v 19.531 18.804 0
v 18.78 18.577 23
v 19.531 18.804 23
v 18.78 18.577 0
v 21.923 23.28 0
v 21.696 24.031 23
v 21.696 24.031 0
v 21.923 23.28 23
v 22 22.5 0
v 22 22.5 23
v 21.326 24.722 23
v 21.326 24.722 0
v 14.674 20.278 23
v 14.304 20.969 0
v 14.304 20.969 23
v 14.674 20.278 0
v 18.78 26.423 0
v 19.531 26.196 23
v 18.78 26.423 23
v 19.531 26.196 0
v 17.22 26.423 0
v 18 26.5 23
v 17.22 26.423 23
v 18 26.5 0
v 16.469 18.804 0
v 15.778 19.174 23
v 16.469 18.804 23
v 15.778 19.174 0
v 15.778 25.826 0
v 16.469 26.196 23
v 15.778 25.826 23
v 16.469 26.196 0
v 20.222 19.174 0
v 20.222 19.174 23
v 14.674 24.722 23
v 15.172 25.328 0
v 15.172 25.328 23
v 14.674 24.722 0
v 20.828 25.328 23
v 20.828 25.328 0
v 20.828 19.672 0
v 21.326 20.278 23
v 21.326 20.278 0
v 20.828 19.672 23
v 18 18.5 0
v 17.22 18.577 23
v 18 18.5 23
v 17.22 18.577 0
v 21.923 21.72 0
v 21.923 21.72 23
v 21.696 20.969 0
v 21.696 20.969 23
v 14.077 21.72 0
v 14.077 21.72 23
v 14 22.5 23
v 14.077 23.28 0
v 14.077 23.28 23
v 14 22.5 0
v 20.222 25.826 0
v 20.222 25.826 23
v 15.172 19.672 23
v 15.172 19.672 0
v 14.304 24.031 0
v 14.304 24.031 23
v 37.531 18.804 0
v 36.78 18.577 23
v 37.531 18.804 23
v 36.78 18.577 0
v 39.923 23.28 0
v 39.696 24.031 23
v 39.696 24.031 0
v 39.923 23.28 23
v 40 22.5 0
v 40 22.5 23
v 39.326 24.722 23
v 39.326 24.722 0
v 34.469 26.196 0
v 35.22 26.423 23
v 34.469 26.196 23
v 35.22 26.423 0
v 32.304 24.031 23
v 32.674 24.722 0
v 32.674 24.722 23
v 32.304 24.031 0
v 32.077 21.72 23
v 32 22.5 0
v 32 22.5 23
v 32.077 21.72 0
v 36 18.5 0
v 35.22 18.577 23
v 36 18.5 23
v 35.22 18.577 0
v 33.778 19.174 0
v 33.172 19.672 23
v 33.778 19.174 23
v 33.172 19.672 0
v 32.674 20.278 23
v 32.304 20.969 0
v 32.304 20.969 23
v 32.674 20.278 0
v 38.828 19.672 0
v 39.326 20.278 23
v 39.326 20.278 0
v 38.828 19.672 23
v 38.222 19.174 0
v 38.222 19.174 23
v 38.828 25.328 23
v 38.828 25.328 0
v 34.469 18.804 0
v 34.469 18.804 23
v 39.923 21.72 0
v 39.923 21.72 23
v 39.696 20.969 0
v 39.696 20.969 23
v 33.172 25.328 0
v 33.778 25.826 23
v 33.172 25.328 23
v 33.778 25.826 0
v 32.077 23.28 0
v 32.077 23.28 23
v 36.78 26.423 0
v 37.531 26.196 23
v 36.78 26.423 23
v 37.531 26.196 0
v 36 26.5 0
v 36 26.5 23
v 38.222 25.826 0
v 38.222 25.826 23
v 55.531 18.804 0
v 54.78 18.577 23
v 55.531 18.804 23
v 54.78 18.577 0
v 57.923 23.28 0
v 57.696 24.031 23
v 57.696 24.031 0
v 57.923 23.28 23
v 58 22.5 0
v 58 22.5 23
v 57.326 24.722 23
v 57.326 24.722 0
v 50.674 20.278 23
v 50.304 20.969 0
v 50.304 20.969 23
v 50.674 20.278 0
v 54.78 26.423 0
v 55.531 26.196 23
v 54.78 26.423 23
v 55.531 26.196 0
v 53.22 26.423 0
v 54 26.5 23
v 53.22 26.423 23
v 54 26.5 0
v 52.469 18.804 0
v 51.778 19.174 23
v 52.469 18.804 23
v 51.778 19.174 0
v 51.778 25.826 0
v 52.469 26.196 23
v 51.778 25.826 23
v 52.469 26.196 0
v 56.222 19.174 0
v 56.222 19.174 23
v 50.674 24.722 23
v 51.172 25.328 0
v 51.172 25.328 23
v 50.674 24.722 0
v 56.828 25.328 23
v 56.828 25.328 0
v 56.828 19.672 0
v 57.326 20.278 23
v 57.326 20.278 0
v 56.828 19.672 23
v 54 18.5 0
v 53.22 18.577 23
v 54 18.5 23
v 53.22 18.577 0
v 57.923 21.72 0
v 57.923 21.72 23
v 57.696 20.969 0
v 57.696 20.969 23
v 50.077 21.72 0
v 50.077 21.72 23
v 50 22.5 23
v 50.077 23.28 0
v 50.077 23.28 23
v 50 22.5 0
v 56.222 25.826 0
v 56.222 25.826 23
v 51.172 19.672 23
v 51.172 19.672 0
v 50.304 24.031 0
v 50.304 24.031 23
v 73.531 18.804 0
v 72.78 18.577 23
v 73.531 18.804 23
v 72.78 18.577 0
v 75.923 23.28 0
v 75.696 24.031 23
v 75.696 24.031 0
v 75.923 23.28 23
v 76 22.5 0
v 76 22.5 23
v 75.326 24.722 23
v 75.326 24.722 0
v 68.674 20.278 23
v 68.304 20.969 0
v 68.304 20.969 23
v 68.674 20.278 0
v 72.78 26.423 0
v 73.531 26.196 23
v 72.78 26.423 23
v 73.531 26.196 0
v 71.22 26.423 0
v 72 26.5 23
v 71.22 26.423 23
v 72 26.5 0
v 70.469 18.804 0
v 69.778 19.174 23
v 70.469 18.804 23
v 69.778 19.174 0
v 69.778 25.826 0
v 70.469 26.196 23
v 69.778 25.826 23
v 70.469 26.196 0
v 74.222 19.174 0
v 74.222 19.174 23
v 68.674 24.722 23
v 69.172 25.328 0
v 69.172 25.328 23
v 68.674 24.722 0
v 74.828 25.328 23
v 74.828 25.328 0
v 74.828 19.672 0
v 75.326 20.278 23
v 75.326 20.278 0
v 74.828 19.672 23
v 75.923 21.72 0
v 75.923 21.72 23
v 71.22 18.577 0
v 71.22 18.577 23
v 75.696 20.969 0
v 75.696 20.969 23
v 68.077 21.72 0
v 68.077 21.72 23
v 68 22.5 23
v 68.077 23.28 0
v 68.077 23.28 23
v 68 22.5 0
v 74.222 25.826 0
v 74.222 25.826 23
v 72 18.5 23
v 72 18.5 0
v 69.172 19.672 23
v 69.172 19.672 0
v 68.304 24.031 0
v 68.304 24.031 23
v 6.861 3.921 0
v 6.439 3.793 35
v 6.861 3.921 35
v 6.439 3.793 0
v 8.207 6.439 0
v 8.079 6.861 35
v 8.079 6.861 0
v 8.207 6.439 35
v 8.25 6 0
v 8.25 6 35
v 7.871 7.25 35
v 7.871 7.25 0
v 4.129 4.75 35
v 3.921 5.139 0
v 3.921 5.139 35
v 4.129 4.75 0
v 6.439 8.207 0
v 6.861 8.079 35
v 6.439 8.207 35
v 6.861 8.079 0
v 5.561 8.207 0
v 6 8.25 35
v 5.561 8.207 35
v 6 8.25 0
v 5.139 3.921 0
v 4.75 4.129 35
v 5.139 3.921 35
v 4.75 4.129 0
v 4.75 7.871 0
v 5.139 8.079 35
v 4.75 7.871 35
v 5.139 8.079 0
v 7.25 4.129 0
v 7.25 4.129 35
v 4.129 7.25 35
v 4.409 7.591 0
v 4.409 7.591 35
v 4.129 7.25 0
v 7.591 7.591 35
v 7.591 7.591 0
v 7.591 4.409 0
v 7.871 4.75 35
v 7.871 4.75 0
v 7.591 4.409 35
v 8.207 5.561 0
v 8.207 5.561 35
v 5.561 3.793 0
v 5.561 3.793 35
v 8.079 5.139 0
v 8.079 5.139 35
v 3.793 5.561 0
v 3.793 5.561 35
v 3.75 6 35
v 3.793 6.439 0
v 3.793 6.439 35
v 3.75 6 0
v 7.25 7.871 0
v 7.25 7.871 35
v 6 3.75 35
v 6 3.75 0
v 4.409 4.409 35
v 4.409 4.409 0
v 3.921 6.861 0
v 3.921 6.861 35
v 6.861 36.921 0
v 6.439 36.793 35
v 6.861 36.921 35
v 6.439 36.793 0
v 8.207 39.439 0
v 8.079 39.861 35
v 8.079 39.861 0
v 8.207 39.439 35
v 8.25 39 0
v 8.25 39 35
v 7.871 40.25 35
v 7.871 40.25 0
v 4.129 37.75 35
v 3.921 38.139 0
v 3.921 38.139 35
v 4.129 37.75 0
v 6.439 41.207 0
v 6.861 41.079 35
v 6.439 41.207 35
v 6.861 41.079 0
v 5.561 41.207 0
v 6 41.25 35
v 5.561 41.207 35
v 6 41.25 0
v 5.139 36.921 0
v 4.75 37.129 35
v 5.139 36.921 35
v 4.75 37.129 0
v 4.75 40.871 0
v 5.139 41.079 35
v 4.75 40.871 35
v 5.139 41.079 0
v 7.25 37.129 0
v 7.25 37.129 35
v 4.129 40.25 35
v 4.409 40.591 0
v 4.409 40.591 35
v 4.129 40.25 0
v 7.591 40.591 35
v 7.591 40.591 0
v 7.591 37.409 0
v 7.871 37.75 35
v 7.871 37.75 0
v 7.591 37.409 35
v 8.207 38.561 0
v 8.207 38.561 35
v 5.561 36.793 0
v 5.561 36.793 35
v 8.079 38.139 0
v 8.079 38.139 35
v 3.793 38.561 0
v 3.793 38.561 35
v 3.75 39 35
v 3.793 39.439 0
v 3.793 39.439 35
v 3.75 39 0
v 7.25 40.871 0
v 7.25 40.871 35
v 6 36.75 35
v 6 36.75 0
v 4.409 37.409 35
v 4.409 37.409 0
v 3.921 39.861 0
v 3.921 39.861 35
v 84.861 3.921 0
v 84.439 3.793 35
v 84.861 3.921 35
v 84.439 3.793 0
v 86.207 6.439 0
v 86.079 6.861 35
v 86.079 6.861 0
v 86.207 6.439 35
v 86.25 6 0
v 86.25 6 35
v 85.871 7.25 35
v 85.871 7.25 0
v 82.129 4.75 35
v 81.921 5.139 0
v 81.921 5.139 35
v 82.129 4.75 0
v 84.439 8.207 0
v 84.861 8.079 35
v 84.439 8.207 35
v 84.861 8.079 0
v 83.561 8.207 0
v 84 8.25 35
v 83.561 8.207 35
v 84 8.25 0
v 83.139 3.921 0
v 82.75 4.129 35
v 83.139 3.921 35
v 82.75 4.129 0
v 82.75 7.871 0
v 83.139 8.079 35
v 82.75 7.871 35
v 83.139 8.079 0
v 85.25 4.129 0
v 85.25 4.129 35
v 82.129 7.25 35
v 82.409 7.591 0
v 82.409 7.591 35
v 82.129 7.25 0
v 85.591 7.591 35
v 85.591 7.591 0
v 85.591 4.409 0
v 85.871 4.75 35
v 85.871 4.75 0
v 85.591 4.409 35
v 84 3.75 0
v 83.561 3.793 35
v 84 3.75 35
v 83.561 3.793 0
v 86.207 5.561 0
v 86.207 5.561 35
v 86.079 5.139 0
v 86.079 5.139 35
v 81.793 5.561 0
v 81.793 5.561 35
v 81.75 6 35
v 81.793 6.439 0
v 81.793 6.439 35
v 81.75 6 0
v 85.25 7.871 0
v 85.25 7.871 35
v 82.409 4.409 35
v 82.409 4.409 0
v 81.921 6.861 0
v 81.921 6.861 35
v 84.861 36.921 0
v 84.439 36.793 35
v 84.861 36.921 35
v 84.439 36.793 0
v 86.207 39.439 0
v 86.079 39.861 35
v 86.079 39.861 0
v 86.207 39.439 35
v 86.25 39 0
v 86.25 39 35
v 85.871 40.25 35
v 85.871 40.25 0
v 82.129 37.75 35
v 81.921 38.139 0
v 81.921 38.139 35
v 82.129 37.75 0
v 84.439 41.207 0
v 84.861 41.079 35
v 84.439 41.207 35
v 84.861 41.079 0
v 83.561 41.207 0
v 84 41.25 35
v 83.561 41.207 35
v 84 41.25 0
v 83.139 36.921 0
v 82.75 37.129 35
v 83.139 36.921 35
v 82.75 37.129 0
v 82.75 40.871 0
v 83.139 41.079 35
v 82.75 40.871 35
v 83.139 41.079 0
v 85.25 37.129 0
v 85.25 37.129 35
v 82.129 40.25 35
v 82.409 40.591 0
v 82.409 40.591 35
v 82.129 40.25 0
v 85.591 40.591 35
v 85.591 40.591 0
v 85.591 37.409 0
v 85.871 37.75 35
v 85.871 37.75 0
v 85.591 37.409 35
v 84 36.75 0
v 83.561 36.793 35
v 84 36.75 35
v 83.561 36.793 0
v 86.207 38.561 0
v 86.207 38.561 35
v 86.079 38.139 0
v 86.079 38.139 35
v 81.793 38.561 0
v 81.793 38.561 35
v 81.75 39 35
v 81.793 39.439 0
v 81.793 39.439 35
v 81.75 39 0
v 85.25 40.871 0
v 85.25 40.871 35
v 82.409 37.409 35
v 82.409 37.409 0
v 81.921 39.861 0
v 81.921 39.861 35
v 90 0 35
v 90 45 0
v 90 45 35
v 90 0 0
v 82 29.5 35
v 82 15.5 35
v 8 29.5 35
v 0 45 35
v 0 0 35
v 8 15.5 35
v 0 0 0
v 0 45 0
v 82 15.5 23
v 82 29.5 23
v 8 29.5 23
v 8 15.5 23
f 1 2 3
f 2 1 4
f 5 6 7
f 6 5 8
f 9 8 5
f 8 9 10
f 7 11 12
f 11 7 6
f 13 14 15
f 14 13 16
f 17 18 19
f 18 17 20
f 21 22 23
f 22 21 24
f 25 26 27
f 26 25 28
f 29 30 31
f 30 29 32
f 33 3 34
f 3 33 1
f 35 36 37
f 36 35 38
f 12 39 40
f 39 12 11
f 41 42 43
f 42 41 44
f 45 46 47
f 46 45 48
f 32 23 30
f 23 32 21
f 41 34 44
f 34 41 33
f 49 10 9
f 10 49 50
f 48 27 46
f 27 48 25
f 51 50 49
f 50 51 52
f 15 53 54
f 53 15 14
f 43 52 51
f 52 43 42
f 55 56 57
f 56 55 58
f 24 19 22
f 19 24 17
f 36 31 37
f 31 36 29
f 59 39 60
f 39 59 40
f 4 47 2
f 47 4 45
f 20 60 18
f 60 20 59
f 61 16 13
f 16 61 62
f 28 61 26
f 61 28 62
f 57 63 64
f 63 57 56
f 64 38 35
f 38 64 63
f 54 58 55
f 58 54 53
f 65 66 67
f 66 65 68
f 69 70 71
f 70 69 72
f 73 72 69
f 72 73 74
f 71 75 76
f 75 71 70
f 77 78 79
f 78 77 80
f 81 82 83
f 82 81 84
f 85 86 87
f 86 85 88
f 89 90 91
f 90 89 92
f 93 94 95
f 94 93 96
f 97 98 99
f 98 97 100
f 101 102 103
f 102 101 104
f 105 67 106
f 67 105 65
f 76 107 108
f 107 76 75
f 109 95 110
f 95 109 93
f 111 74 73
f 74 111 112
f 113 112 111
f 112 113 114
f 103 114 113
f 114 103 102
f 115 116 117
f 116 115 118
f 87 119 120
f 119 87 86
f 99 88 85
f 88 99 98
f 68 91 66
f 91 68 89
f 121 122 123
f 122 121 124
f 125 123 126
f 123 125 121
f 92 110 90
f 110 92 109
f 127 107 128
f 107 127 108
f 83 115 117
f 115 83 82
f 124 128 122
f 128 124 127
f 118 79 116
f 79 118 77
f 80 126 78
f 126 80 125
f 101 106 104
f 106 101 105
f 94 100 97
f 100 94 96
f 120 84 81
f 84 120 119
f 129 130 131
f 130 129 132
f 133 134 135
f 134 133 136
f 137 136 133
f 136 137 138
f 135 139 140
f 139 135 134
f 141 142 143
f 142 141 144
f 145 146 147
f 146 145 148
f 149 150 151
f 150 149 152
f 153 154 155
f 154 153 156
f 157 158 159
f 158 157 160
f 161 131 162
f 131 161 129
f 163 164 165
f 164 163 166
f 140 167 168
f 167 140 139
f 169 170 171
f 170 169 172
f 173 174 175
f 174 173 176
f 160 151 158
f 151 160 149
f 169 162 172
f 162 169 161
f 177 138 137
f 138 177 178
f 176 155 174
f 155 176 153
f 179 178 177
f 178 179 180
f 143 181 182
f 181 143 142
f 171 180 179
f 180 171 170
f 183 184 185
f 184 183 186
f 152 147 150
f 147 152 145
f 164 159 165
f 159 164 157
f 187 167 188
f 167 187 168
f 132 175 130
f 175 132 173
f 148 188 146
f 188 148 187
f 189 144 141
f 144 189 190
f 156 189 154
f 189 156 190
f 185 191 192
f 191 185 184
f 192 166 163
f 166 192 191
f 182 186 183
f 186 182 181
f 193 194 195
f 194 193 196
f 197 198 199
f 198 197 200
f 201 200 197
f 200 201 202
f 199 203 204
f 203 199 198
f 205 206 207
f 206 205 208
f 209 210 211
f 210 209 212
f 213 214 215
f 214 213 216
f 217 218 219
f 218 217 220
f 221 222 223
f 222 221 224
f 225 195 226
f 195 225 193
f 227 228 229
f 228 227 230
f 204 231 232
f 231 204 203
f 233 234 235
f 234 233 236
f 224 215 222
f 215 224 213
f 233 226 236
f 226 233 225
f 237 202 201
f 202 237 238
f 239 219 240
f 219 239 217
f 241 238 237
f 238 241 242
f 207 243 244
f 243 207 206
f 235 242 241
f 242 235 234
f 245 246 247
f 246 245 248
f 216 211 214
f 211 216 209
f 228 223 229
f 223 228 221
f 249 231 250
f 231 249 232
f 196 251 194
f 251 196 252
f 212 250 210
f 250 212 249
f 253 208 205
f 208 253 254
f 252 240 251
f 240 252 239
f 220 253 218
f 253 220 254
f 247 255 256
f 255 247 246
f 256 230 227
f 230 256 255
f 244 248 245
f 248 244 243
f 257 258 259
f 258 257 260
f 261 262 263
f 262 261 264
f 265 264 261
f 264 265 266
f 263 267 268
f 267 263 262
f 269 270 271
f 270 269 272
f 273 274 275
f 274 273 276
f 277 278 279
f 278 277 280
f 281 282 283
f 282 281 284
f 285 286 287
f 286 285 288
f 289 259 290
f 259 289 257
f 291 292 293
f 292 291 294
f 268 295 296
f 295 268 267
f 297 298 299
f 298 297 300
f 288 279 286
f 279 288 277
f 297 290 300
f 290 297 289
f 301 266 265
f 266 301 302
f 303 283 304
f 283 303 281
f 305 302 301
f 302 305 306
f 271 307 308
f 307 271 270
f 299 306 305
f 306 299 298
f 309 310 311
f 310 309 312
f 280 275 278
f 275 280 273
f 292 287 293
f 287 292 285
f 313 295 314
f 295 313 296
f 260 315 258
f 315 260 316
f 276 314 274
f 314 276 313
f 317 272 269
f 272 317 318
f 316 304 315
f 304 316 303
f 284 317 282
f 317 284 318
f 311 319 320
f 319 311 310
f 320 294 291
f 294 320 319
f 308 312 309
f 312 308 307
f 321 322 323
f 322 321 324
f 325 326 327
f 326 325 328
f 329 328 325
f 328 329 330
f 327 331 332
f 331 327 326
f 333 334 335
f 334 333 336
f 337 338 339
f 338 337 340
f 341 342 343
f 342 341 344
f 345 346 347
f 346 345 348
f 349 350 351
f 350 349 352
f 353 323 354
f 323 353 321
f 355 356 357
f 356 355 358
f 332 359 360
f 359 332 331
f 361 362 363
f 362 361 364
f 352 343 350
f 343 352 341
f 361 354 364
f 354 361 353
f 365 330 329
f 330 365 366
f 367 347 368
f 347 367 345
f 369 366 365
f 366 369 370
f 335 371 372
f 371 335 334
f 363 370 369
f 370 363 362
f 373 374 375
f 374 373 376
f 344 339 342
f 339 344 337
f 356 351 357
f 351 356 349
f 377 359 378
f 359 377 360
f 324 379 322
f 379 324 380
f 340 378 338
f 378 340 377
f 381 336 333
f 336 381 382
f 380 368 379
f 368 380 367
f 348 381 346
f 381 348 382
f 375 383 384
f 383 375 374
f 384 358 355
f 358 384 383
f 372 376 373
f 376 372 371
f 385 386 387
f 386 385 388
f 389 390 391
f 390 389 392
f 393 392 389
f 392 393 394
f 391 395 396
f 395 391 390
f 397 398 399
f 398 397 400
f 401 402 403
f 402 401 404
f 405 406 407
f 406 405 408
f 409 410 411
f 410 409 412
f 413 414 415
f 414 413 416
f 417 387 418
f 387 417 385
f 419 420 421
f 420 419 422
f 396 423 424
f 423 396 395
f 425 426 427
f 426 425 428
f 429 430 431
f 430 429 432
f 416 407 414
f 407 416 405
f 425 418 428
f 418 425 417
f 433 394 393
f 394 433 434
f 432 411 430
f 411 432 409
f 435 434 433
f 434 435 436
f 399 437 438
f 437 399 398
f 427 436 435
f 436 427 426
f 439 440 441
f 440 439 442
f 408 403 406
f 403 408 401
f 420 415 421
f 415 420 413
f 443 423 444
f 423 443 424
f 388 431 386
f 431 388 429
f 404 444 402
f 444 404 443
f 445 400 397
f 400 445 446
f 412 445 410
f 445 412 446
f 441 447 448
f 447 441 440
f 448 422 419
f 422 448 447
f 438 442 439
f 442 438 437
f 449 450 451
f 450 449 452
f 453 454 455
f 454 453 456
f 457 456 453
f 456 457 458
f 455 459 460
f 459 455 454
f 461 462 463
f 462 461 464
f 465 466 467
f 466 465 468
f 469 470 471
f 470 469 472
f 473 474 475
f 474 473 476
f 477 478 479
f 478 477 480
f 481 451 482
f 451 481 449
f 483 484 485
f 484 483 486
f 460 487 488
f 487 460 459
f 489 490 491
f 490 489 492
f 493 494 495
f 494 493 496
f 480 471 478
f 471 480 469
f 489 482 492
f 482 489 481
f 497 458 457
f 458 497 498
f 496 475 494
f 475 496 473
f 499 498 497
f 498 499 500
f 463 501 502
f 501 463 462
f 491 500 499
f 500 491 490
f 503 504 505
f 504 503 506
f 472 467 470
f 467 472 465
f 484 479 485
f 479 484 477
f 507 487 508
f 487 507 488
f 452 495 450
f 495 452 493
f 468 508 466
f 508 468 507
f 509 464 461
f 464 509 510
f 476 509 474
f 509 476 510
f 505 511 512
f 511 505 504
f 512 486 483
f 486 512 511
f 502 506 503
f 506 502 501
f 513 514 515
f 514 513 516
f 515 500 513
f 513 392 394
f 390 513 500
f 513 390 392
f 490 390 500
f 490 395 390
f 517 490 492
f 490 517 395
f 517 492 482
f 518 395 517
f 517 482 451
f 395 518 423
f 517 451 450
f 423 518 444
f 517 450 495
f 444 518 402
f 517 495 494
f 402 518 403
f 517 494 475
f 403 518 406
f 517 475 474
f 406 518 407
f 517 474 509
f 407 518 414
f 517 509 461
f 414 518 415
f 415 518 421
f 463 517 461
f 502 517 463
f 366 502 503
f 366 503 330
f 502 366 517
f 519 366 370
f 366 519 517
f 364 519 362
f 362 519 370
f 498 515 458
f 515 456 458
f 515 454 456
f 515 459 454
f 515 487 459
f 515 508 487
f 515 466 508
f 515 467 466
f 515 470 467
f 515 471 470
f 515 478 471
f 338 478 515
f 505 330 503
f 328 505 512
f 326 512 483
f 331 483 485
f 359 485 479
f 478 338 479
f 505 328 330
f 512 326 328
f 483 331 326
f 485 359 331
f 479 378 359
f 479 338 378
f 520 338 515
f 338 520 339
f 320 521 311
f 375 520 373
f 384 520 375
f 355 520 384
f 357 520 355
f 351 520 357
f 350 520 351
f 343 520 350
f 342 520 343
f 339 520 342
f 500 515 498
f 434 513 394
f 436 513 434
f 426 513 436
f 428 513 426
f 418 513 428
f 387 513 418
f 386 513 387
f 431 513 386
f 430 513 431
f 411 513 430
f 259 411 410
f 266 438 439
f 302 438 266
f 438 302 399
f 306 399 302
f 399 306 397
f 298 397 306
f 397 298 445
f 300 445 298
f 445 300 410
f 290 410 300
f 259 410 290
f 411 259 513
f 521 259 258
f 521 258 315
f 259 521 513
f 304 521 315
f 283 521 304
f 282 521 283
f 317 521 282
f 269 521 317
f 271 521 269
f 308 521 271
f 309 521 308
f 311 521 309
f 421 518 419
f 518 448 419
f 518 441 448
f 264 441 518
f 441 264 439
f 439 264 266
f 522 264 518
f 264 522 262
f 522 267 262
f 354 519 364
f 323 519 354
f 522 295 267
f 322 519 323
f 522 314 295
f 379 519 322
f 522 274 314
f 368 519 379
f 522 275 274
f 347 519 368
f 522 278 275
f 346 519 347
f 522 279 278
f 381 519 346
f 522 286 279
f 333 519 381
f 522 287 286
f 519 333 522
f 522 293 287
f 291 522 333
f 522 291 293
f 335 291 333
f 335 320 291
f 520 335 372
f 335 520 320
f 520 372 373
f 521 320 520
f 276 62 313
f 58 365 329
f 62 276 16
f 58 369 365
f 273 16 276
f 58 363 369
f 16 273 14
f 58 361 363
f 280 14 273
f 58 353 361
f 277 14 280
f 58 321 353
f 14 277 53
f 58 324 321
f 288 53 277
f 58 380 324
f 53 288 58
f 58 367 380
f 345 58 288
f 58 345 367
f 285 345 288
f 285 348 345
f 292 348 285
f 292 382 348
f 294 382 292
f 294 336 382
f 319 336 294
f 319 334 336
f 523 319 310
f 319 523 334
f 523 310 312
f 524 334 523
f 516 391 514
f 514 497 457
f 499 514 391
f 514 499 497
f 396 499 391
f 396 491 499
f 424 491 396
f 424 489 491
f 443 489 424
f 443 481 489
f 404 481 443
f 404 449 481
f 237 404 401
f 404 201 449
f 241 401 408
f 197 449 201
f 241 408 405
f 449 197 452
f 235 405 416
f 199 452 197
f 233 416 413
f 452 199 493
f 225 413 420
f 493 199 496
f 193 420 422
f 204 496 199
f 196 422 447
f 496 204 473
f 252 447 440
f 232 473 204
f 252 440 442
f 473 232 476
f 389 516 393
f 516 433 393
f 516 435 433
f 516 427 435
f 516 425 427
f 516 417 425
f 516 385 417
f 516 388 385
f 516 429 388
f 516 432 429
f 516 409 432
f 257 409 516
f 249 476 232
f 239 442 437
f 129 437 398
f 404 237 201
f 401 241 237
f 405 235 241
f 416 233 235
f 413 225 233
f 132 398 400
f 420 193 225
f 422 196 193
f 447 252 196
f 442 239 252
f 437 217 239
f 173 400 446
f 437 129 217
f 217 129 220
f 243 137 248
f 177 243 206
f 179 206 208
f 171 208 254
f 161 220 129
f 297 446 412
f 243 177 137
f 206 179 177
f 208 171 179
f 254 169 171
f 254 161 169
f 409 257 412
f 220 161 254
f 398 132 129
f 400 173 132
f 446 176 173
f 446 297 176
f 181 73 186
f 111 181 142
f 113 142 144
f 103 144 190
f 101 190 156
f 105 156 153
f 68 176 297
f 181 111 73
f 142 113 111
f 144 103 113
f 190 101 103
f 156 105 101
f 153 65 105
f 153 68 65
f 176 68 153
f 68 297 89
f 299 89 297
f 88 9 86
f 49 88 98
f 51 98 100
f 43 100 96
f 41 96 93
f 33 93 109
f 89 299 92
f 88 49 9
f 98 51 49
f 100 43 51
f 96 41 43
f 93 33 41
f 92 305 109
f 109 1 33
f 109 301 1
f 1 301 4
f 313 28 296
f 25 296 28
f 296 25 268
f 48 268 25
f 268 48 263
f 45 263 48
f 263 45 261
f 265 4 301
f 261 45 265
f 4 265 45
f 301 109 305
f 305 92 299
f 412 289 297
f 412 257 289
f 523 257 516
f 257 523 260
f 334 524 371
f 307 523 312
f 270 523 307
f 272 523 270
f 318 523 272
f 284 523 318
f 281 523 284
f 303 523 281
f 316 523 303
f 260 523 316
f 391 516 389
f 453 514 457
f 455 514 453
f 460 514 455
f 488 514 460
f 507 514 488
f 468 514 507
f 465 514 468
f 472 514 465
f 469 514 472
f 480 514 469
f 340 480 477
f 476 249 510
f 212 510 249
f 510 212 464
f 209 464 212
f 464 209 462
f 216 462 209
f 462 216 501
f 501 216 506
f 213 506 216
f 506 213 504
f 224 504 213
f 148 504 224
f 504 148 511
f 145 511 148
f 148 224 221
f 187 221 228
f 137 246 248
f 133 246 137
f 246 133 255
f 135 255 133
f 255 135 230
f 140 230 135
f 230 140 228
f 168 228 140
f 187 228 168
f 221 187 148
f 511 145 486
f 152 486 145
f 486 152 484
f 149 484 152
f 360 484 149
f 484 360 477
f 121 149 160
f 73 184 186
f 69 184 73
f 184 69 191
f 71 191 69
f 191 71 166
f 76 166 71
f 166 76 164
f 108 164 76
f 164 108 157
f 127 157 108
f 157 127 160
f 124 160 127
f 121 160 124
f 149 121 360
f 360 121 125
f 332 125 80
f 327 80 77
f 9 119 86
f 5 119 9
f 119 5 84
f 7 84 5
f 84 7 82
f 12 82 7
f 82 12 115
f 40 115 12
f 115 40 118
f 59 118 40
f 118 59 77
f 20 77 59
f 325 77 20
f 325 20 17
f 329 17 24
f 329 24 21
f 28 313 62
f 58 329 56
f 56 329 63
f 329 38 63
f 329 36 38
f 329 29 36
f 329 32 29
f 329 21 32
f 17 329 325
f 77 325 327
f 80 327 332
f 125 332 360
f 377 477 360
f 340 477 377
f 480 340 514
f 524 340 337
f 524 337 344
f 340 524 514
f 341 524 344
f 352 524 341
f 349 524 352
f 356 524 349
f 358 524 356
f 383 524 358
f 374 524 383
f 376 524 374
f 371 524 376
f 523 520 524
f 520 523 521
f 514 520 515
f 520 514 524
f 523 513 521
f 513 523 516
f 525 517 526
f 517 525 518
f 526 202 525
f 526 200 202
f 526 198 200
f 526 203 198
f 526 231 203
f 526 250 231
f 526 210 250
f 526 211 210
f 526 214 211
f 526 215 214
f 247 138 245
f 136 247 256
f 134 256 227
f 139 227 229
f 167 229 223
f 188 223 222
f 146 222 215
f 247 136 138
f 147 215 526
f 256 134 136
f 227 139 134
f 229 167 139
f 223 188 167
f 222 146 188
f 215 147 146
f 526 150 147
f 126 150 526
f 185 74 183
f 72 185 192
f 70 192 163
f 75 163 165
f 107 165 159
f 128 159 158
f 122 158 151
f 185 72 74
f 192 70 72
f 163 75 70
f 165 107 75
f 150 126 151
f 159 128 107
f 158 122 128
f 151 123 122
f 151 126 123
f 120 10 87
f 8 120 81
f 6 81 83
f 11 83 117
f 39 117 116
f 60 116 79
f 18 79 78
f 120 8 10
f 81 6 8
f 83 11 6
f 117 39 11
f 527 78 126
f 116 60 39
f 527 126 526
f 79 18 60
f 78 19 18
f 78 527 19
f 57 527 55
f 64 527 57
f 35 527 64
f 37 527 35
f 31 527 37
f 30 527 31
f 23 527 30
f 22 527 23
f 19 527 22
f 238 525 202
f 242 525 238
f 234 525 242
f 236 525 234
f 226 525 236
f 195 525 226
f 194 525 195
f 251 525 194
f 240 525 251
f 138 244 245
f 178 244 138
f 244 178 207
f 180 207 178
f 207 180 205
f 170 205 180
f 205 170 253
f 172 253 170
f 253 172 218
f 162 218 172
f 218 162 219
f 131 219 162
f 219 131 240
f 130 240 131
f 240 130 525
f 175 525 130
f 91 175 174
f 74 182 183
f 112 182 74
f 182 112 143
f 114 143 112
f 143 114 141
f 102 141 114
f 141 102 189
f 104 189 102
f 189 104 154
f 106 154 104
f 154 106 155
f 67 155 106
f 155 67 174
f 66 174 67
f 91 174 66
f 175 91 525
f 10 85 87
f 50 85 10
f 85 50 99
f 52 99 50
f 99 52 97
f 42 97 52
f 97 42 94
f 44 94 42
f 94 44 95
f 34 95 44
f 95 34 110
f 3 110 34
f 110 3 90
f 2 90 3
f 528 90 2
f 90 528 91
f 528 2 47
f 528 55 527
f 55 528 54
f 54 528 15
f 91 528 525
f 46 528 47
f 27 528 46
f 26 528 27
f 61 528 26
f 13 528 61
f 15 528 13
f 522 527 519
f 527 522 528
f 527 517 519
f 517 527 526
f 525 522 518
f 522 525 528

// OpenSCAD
$fn = 32;

// ----------------------------------------------------------------------
// Manifold block: gallery_top manifold
// ----------------------------------------------------------------------

// --- parameters (mm) ---
block_l = 90;             // block length, X
block_w = 45;             // block width, Y
block_h = 35;             // block height, Z
port_d = 8;               // port bore diameter
port_pitch = 18;          // port pitch along X
gallery_d = 14;           // top gallery width, Y
gallery_depth = 12;       // gallery pocket depth
wall_p = 8;               // gallery end wall thickness, X
mnt_d = 4.5;              // mounting hole diameter
mnt_in = 6;               // mounting hole inset from the edges

n_ports = 4;  // ports in the row
port_x0 = (block_l - (n_ports - 1) * port_pitch) / 2;  // first port X

difference() {
  cube([block_l, block_w, block_h]);
  for (i = [0 : n_ports - 1])
    translate([port_x0 + i * port_pitch, block_w / 2, -1])
      cylinder(h = block_h + 2, d = port_d);
  translate([wall_p, block_w / 2 - gallery_d / 2, block_h - gallery_depth])
    cube([block_l - 2 * wall_p, gallery_d, gallery_depth + 1]);
  for (cx = [mnt_in, block_l - mnt_in])
    for (cy = [mnt_in, block_w - mnt_in])
      translate([cx, cy, -1]) cylinder(h = block_h + 2, d = mnt_d);
}
